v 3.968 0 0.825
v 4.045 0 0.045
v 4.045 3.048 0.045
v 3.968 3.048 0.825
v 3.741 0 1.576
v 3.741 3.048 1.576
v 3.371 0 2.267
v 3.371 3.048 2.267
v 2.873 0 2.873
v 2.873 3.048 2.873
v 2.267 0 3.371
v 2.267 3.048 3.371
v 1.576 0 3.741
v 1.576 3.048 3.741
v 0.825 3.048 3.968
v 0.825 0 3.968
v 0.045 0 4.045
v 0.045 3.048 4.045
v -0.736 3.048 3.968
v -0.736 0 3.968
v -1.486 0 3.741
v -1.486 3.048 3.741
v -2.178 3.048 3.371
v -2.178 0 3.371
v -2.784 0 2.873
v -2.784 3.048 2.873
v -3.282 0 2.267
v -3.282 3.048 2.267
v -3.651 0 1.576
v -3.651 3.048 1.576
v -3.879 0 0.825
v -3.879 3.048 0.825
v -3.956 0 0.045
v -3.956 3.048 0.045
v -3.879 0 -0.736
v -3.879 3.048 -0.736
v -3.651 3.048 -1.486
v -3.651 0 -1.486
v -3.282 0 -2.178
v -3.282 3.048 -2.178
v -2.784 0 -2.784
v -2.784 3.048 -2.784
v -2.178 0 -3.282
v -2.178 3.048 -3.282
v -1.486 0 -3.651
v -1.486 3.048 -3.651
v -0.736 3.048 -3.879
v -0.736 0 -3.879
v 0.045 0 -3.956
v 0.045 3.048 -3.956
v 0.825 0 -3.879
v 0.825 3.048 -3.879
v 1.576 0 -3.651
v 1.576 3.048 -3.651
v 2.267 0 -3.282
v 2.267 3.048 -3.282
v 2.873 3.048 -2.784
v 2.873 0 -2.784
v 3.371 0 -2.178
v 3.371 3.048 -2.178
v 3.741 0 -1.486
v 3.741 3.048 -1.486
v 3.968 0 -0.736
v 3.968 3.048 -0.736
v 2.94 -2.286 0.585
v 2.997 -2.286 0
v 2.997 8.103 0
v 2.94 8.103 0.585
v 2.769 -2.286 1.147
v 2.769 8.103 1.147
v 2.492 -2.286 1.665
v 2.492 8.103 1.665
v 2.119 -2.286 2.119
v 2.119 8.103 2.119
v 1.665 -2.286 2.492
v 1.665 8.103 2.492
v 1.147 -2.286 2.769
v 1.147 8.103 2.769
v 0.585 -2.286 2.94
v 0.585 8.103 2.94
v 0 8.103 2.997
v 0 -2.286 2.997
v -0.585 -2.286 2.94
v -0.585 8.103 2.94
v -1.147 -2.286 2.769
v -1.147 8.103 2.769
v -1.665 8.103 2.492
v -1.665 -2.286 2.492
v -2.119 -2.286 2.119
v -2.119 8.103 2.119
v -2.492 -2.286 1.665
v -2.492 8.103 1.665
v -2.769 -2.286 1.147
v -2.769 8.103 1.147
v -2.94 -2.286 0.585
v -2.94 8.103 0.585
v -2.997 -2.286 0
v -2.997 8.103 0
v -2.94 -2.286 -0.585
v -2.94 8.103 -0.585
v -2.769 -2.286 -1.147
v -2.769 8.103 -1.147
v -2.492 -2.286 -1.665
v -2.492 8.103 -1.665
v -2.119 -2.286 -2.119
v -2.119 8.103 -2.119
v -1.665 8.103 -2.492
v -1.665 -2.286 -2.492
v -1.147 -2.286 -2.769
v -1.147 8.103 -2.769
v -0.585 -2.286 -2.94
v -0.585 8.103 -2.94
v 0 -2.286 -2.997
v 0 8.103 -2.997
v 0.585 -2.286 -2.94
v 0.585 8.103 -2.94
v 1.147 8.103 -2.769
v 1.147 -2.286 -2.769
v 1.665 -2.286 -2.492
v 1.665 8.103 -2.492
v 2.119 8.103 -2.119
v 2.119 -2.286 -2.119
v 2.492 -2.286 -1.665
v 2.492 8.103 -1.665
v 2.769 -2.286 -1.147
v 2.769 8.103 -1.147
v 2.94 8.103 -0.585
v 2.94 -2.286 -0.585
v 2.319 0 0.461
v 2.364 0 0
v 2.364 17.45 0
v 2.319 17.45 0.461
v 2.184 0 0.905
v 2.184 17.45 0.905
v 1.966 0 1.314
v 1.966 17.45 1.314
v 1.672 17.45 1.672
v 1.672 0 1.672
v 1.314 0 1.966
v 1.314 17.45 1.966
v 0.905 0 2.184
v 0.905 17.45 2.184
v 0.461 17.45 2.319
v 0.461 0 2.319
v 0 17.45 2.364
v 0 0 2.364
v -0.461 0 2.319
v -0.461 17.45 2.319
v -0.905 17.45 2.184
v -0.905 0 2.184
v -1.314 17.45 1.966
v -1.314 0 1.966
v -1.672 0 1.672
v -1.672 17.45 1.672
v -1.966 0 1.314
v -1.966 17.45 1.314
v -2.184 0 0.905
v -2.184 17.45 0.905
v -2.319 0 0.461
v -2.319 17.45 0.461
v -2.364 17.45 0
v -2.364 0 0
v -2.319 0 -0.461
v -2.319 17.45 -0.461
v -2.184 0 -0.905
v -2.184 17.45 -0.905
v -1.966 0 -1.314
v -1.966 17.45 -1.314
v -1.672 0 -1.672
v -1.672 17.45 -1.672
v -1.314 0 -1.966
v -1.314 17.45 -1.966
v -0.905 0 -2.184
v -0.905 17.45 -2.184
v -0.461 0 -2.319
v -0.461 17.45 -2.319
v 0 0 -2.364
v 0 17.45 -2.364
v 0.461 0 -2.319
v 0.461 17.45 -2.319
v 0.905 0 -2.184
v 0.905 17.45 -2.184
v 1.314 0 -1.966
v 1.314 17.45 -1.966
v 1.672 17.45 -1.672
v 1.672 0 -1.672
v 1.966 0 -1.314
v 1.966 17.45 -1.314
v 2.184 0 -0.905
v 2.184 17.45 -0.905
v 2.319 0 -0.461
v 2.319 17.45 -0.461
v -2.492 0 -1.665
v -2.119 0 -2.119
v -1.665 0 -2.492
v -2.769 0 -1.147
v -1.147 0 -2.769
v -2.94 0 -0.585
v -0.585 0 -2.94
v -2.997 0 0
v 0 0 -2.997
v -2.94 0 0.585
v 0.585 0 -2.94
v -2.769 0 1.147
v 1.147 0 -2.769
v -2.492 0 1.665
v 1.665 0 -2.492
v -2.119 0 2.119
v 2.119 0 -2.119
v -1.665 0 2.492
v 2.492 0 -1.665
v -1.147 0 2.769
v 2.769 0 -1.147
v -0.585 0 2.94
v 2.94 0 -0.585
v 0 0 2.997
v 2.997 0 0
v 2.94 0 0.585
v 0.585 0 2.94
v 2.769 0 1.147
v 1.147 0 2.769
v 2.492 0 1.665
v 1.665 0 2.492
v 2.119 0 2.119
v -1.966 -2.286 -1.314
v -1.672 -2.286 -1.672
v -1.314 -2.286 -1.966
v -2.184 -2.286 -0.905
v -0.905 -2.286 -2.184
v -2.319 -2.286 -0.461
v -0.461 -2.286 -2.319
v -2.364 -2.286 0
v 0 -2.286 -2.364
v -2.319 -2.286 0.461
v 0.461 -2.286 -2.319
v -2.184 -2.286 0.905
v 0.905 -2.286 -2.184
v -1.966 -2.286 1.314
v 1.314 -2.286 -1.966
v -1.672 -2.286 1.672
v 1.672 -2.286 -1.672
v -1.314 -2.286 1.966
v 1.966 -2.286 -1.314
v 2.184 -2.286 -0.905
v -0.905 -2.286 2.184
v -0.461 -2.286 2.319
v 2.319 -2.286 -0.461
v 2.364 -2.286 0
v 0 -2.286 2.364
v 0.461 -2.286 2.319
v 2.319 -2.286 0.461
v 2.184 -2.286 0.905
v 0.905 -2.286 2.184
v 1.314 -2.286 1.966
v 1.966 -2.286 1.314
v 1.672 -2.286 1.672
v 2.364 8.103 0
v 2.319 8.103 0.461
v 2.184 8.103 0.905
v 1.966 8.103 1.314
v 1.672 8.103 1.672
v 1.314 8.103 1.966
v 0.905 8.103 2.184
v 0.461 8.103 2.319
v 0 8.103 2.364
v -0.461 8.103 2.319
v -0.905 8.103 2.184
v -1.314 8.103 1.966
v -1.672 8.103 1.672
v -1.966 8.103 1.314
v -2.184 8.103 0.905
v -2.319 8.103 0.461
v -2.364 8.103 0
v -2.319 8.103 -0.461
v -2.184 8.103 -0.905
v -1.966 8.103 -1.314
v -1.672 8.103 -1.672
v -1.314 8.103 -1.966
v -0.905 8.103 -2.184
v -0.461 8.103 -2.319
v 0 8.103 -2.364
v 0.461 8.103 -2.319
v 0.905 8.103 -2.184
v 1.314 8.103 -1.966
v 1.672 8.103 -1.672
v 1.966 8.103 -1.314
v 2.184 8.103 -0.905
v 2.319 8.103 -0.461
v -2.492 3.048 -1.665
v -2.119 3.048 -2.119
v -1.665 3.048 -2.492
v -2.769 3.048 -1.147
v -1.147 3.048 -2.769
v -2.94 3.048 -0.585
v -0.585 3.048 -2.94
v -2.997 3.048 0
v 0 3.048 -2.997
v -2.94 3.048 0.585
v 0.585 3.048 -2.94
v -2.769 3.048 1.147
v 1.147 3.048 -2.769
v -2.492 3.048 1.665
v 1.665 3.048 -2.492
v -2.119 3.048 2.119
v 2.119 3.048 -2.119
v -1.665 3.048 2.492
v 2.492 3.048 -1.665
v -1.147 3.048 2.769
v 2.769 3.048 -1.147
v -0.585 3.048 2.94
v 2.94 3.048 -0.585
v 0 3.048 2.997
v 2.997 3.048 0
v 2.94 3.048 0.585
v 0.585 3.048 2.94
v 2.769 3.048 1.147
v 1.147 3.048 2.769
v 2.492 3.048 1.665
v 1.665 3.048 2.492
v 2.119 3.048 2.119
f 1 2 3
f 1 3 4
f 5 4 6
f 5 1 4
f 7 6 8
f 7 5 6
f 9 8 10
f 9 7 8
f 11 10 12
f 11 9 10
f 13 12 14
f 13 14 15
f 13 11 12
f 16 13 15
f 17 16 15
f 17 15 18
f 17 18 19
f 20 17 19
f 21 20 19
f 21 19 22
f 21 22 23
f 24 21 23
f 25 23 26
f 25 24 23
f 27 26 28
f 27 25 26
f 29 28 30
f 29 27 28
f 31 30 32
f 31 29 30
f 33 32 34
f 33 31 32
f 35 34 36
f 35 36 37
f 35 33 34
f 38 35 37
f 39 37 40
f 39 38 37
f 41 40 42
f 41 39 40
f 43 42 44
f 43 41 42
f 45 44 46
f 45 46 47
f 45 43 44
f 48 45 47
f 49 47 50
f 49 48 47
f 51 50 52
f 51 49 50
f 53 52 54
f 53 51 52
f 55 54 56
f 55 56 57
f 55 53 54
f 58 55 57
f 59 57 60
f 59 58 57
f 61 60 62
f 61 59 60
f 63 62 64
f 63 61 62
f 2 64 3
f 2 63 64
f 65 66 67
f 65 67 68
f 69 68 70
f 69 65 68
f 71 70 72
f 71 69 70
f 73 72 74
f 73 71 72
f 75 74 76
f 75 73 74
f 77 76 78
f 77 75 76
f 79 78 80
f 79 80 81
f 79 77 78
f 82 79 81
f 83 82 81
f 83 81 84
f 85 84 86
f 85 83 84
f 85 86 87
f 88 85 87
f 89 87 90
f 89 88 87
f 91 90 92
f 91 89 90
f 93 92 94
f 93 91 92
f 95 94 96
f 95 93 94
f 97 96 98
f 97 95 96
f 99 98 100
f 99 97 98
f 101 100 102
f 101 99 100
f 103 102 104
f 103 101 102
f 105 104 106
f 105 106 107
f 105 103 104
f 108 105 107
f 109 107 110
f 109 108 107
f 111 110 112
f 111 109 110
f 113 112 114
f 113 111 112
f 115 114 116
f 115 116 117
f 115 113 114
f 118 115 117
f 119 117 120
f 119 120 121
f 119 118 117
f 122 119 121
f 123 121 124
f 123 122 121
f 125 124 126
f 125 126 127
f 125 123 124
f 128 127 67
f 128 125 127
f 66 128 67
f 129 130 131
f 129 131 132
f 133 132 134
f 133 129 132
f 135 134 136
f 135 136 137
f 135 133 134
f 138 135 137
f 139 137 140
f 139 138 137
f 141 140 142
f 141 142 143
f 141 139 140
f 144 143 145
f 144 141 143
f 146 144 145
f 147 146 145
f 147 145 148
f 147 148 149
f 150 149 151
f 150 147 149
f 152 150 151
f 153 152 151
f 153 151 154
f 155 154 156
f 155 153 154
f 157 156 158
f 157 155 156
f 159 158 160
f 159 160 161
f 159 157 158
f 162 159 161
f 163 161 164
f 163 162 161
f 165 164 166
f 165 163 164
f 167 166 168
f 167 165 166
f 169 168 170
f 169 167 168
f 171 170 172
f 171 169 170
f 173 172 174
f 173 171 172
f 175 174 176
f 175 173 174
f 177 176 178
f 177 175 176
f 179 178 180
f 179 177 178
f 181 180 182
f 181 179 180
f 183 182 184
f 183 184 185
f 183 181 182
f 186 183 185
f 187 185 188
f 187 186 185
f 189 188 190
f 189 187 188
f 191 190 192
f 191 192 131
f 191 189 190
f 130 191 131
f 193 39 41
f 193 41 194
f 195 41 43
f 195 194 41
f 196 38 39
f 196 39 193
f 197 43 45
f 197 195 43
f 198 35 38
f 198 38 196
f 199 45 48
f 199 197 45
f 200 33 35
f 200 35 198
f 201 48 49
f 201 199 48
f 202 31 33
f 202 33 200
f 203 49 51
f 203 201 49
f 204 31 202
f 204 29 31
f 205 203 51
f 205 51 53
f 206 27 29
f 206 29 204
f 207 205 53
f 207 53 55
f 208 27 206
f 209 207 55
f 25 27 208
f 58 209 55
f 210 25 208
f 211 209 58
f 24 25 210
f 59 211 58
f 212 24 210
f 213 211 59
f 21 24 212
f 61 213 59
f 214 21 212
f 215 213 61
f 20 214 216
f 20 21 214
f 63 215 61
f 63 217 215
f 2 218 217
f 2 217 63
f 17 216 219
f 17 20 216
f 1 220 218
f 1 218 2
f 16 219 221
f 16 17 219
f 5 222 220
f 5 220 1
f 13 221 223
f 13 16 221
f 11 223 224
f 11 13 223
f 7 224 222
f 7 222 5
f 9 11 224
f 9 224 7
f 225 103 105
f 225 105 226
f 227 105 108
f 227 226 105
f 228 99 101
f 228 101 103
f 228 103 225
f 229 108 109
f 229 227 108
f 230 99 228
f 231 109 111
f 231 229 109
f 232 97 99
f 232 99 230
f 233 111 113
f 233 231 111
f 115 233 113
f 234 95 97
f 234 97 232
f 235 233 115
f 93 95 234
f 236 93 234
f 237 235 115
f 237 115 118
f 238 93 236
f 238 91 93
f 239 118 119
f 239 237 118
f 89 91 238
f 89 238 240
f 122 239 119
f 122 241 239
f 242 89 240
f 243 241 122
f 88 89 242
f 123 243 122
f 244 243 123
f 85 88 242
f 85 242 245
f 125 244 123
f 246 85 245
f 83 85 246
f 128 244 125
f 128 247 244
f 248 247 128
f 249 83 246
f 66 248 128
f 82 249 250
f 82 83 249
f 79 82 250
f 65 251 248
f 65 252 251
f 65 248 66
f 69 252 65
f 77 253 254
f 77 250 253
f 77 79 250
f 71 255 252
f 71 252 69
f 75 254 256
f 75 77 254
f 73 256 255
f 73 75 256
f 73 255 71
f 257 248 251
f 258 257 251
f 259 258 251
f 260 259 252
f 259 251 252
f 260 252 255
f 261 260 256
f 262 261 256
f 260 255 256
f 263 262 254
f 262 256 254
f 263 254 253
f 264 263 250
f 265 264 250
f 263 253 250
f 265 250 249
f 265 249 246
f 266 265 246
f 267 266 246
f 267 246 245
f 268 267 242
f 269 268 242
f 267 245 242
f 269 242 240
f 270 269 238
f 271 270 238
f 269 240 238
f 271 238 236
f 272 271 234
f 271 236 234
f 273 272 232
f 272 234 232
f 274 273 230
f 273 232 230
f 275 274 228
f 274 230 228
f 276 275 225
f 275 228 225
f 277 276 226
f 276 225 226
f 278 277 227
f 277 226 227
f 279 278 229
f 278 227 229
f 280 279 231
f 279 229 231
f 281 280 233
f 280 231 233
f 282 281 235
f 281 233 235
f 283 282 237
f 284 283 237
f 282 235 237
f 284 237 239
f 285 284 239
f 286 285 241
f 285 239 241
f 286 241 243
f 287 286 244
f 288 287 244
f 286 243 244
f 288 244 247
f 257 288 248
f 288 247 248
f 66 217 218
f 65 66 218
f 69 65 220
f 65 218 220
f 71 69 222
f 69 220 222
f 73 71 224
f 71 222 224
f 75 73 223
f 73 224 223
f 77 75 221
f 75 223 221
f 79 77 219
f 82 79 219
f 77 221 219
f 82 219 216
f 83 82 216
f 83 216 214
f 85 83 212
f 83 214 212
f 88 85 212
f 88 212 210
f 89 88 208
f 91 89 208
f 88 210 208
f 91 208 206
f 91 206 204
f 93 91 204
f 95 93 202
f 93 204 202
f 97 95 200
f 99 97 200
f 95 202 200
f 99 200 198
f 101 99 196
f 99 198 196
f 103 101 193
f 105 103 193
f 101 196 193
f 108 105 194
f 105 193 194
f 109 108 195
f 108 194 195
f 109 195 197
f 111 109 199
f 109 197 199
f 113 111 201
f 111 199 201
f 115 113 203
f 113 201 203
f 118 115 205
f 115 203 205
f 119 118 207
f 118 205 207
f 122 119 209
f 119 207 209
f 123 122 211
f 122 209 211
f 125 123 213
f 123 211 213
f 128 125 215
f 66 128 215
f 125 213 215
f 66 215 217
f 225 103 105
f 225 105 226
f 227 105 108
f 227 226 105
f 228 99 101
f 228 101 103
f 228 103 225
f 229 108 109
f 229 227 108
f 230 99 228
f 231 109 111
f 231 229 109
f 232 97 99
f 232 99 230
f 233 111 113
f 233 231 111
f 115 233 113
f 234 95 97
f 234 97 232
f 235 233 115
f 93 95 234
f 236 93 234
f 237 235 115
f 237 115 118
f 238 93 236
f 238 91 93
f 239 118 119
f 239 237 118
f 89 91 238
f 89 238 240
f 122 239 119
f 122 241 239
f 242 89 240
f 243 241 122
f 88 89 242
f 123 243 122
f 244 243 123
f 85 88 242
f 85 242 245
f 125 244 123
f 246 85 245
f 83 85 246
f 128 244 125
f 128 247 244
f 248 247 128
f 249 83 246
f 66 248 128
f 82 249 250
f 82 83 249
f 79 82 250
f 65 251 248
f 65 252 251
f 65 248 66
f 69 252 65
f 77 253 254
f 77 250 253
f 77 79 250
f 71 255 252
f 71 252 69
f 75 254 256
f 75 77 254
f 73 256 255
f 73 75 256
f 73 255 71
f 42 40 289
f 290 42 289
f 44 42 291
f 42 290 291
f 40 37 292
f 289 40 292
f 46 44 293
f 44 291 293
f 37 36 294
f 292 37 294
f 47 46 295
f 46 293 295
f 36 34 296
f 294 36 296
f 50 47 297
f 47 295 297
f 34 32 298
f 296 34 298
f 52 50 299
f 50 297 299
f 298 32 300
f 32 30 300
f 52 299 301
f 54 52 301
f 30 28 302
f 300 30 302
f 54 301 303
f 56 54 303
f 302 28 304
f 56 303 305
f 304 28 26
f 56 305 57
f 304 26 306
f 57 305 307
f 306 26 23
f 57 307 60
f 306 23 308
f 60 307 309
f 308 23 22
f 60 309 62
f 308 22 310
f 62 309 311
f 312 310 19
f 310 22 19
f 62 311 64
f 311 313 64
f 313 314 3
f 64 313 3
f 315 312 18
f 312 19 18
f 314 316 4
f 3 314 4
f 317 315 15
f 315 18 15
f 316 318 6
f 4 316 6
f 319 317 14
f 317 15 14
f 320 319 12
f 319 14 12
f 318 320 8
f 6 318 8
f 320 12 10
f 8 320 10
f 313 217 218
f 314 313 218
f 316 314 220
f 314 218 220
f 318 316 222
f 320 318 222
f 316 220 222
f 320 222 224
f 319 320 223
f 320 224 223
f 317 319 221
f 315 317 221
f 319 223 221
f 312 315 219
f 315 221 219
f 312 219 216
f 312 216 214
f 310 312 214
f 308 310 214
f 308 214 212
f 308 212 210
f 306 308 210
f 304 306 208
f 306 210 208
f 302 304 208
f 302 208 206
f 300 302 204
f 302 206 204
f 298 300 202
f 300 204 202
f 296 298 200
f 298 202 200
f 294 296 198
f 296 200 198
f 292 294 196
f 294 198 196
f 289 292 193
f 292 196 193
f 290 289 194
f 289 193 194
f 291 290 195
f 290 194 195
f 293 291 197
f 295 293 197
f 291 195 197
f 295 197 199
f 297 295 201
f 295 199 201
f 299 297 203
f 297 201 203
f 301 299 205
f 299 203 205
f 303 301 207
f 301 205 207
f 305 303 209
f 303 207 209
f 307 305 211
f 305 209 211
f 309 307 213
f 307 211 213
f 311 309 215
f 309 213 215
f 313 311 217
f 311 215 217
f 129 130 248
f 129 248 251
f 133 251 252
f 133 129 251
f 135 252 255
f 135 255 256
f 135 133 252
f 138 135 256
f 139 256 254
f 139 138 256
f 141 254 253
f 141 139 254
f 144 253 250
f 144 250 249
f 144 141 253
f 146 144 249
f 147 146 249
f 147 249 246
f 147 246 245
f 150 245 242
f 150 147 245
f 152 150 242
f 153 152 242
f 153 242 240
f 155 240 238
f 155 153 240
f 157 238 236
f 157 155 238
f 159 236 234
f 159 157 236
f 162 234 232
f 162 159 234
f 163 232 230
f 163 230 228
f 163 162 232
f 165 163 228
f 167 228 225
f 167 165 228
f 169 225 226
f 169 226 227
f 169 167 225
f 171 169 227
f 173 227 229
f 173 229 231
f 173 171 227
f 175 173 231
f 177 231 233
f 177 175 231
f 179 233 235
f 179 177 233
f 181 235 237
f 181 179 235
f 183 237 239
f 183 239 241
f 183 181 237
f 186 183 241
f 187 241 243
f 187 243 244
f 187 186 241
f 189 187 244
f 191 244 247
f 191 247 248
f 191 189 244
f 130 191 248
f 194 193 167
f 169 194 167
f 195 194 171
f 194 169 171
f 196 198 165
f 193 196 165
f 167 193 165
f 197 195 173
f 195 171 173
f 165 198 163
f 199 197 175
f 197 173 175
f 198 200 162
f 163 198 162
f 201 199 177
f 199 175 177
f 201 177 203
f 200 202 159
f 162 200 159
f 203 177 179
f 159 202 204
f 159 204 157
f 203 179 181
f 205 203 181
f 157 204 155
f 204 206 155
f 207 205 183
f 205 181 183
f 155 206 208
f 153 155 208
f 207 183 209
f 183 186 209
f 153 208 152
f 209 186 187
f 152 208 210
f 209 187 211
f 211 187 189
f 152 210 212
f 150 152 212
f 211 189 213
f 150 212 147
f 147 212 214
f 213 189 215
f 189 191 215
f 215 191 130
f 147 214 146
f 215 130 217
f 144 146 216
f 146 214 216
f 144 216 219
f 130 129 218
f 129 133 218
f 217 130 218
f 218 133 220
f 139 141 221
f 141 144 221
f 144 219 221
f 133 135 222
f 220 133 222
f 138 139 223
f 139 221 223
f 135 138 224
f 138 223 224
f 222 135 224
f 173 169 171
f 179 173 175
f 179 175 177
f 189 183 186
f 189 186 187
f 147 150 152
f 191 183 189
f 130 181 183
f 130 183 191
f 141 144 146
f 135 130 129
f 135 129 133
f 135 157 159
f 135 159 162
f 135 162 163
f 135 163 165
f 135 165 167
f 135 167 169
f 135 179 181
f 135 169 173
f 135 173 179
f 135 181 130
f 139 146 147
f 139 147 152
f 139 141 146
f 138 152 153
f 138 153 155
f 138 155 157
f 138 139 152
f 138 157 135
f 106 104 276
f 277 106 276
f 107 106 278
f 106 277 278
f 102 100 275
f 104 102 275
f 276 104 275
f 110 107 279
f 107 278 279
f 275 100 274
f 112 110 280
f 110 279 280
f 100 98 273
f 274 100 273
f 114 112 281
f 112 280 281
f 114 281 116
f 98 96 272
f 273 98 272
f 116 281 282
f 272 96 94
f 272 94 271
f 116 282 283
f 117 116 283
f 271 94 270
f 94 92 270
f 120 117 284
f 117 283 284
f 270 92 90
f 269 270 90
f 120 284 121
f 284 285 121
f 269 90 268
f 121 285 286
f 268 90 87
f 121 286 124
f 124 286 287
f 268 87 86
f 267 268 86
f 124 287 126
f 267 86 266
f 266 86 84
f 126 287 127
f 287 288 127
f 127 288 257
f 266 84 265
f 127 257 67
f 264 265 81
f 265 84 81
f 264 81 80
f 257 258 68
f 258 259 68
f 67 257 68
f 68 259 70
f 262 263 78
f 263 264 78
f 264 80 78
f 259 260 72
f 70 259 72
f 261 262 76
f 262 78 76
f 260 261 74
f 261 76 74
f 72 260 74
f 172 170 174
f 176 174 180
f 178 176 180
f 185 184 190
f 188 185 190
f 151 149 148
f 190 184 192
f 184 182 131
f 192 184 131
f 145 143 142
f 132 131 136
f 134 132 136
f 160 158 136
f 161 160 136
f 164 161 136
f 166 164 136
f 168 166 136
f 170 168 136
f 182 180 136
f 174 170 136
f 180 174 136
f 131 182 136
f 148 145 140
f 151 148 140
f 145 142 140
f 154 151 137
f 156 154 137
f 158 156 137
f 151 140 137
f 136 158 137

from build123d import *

# Parameters (mm, degrees)
F0_R     = 2.9972
F0_R_2   = 2.3642688297
F1_DEPTH = 2.286
F0_R_3   = 4.0005
F2_DEPTH = 3.048
F3_DEPTH = 10.3886
F4_DEPTH = 17.4498


with BuildPart() as f1:
    # F0 (on Front) → F1 (new body)
    with BuildSketch(Plane.XZ):
        Circle(F0_R)
        Circle(F0_R_2, mode=Mode.SUBTRACT)
    extrude(amount=F1_DEPTH)


with BuildPart() as f2:
    # F0 (on Front) → F2 (new body)
    with BuildSketch(Plane.XZ):
        with Locations((0.0446345569, 0.0446349857)):
            Circle(F0_R_3)
        Circle(F0_R, mode=Mode.SUBTRACT)
    extrude(amount=-F2_DEPTH)


with BuildPart() as f3:
    # F3 (new): a face of the model
    f3_faces = [f1.part.faces().sort_by_distance(p)[0] for p in [
        (-2.9124263822, -2.286, 0),
    ]]
    extrude(f3_faces, amount=-F3_DEPTH)


with BuildPart() as f4:
    # F0 (on Front) → F4 (new body)
    with BuildSketch(Plane.XZ):
        Circle(F0_R_2)
    extrude(amount=-F4_DEPTH)


solid = Compound([f1.part, f2.part, f3.part, f4.part])
